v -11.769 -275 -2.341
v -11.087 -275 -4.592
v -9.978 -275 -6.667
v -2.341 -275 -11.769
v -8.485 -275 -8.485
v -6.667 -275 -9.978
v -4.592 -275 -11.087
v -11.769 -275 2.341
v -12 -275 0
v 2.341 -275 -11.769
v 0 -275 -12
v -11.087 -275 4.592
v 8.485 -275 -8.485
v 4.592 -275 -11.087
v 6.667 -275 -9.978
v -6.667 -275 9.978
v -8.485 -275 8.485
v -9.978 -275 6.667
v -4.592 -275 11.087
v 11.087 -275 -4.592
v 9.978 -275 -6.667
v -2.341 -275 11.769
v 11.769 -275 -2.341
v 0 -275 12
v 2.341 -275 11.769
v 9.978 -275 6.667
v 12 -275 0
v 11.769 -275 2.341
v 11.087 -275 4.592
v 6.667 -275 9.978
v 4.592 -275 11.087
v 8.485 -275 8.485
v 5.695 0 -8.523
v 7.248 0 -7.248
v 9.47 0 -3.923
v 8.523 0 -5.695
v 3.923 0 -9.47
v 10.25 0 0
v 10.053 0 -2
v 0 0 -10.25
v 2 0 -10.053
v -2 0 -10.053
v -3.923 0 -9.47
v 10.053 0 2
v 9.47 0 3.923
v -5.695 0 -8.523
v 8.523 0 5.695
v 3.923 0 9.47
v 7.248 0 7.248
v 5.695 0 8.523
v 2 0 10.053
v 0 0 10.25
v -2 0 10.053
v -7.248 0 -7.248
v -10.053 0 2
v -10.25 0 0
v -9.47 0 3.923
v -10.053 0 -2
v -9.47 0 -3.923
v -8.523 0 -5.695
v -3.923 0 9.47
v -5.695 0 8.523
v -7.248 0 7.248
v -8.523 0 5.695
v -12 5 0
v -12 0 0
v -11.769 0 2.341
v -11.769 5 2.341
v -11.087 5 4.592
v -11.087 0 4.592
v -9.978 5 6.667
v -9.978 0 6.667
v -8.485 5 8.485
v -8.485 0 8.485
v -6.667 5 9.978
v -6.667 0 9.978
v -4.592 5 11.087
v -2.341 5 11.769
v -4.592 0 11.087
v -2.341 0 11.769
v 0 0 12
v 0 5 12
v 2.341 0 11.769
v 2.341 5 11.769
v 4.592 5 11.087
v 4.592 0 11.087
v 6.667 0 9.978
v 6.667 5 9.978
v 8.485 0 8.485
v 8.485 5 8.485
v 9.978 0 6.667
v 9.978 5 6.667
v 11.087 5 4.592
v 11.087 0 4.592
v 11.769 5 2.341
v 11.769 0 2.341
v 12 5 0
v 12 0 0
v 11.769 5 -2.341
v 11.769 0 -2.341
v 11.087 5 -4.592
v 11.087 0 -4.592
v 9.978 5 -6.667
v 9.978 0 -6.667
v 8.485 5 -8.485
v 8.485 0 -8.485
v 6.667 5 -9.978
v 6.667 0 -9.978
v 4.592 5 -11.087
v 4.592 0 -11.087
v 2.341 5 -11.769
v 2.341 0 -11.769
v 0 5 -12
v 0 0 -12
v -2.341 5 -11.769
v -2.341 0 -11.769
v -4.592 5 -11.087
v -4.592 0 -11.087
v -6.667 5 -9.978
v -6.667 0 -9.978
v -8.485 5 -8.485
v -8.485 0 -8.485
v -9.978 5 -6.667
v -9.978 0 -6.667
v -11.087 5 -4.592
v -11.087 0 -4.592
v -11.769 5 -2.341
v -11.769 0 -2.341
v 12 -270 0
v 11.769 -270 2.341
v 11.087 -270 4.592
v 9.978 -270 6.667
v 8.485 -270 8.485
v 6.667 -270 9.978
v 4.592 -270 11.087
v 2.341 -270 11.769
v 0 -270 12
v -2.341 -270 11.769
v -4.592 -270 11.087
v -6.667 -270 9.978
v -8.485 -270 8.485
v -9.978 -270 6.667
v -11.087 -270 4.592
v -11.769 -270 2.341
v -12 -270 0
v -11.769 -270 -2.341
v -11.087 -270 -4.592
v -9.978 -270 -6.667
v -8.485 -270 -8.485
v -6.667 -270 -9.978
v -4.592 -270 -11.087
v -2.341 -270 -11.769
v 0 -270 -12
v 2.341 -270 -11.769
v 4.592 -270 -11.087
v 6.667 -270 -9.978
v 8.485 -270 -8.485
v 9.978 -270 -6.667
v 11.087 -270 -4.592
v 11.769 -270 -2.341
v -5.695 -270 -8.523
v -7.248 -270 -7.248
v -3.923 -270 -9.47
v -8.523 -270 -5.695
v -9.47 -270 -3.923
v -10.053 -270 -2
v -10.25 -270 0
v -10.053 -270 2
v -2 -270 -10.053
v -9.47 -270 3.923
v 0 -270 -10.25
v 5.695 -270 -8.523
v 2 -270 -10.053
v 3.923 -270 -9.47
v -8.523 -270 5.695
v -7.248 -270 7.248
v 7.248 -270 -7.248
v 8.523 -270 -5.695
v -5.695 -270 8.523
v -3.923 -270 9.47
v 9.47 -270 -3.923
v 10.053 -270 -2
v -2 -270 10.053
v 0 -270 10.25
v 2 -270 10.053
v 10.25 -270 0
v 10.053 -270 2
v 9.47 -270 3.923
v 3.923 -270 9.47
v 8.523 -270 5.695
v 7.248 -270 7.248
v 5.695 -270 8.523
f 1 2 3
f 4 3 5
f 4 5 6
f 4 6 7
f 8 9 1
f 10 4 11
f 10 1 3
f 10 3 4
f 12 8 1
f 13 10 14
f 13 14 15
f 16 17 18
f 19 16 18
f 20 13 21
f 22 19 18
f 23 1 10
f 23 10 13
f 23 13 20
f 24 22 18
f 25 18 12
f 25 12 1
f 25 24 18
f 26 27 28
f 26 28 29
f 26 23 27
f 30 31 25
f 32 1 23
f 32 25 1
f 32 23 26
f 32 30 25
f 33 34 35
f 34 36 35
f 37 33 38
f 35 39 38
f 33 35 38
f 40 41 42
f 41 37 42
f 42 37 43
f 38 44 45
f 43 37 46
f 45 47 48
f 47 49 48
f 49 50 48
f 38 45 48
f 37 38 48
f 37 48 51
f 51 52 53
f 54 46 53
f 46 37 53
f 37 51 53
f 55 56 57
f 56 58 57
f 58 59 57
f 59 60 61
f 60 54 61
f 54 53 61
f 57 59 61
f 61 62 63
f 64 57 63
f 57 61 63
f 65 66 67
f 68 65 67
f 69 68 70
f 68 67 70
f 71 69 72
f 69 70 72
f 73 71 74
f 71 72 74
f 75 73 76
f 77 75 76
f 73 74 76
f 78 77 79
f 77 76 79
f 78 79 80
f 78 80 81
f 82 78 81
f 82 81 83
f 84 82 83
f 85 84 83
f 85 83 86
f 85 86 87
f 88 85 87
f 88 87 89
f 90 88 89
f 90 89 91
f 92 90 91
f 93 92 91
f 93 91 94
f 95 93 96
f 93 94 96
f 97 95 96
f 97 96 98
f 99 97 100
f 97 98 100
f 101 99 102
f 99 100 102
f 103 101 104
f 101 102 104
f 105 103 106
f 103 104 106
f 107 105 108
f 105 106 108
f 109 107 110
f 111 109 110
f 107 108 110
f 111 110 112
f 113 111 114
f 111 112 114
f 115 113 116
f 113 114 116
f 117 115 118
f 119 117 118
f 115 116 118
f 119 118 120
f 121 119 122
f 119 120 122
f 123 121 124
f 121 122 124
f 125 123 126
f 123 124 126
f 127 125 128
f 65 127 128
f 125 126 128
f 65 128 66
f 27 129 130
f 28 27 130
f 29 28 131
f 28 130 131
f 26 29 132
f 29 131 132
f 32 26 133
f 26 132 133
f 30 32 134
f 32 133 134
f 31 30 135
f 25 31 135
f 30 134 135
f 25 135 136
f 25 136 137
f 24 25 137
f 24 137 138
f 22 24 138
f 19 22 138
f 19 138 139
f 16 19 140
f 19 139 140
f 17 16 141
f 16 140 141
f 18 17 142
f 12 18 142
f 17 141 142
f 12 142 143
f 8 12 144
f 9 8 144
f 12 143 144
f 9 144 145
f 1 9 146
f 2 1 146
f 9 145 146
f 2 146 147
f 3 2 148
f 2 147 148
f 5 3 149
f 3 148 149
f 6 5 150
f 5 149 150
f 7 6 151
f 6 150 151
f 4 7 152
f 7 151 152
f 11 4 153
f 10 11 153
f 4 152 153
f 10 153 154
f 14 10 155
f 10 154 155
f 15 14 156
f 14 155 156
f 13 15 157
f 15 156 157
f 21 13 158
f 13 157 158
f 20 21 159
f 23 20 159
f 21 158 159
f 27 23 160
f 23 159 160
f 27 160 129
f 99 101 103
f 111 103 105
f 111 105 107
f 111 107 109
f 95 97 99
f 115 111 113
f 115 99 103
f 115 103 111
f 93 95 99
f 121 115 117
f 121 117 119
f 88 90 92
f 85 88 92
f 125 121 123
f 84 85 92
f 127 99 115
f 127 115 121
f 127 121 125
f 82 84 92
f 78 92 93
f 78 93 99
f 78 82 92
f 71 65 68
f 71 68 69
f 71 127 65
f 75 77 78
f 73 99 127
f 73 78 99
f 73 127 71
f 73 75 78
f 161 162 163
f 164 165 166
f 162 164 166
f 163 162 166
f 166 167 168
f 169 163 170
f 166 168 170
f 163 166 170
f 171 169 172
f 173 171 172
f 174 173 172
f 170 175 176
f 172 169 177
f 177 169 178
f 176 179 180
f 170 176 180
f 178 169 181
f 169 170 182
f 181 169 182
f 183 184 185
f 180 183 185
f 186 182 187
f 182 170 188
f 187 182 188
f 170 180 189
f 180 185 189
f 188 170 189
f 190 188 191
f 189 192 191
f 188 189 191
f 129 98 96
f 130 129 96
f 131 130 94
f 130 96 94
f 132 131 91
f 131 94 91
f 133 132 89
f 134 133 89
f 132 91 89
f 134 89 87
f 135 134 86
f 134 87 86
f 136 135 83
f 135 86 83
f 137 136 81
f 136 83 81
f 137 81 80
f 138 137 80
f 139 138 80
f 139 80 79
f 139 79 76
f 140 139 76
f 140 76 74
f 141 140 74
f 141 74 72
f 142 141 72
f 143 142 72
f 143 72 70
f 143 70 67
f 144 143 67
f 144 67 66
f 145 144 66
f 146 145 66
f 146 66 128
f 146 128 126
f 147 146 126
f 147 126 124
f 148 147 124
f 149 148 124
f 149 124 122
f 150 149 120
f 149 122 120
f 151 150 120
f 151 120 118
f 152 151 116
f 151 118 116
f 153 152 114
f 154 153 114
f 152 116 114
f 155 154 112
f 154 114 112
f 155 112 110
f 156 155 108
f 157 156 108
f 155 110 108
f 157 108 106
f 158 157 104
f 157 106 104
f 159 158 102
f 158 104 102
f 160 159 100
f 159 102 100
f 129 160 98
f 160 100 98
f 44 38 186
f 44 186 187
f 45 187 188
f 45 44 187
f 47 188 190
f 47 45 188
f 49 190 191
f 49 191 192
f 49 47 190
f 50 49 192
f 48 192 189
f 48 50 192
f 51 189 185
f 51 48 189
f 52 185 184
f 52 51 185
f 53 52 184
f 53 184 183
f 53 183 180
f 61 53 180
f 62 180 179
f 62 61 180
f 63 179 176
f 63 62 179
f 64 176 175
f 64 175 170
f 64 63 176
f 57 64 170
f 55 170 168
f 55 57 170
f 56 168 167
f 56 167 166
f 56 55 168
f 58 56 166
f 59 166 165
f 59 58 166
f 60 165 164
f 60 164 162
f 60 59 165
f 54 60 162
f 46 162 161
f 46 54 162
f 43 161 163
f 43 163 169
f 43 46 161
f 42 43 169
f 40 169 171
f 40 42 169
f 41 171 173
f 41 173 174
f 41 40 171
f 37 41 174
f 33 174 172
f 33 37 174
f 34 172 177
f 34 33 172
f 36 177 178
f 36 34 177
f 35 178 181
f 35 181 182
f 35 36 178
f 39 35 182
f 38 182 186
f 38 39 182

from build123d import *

# Parameters (mm, degrees)
F0_R     = 12
F0_R_2   = 10.25
F1_DEPTH = 270
F2_R     = 12
F3_DEPTH = 5
F4_R     = 12
F5_DEPTH = 5


with BuildPart() as f1:
    # F0 (on Front) → F1 (new body)
    with BuildSketch(Plane.XZ):
        Circle(F0_R)
        Circle(F0_R_2, mode=Mode.SUBTRACT)
    extrude(amount=F1_DEPTH)

    # F2 (on face) → F3 (join)
    with BuildSketch(Plane(origin=(0, 0, 0), x_dir=(-1, 0, 0), z_dir=(0, 1, 0))):
        Circle(F2_R)
    extrude(amount=F3_DEPTH)

    # F4 (on face) → F5 (join)
    with BuildSketch(Plane.XZ.offset(270)):
        Circle(F4_R)
    extrude(amount=F5_DEPTH)


solid = f1.part
